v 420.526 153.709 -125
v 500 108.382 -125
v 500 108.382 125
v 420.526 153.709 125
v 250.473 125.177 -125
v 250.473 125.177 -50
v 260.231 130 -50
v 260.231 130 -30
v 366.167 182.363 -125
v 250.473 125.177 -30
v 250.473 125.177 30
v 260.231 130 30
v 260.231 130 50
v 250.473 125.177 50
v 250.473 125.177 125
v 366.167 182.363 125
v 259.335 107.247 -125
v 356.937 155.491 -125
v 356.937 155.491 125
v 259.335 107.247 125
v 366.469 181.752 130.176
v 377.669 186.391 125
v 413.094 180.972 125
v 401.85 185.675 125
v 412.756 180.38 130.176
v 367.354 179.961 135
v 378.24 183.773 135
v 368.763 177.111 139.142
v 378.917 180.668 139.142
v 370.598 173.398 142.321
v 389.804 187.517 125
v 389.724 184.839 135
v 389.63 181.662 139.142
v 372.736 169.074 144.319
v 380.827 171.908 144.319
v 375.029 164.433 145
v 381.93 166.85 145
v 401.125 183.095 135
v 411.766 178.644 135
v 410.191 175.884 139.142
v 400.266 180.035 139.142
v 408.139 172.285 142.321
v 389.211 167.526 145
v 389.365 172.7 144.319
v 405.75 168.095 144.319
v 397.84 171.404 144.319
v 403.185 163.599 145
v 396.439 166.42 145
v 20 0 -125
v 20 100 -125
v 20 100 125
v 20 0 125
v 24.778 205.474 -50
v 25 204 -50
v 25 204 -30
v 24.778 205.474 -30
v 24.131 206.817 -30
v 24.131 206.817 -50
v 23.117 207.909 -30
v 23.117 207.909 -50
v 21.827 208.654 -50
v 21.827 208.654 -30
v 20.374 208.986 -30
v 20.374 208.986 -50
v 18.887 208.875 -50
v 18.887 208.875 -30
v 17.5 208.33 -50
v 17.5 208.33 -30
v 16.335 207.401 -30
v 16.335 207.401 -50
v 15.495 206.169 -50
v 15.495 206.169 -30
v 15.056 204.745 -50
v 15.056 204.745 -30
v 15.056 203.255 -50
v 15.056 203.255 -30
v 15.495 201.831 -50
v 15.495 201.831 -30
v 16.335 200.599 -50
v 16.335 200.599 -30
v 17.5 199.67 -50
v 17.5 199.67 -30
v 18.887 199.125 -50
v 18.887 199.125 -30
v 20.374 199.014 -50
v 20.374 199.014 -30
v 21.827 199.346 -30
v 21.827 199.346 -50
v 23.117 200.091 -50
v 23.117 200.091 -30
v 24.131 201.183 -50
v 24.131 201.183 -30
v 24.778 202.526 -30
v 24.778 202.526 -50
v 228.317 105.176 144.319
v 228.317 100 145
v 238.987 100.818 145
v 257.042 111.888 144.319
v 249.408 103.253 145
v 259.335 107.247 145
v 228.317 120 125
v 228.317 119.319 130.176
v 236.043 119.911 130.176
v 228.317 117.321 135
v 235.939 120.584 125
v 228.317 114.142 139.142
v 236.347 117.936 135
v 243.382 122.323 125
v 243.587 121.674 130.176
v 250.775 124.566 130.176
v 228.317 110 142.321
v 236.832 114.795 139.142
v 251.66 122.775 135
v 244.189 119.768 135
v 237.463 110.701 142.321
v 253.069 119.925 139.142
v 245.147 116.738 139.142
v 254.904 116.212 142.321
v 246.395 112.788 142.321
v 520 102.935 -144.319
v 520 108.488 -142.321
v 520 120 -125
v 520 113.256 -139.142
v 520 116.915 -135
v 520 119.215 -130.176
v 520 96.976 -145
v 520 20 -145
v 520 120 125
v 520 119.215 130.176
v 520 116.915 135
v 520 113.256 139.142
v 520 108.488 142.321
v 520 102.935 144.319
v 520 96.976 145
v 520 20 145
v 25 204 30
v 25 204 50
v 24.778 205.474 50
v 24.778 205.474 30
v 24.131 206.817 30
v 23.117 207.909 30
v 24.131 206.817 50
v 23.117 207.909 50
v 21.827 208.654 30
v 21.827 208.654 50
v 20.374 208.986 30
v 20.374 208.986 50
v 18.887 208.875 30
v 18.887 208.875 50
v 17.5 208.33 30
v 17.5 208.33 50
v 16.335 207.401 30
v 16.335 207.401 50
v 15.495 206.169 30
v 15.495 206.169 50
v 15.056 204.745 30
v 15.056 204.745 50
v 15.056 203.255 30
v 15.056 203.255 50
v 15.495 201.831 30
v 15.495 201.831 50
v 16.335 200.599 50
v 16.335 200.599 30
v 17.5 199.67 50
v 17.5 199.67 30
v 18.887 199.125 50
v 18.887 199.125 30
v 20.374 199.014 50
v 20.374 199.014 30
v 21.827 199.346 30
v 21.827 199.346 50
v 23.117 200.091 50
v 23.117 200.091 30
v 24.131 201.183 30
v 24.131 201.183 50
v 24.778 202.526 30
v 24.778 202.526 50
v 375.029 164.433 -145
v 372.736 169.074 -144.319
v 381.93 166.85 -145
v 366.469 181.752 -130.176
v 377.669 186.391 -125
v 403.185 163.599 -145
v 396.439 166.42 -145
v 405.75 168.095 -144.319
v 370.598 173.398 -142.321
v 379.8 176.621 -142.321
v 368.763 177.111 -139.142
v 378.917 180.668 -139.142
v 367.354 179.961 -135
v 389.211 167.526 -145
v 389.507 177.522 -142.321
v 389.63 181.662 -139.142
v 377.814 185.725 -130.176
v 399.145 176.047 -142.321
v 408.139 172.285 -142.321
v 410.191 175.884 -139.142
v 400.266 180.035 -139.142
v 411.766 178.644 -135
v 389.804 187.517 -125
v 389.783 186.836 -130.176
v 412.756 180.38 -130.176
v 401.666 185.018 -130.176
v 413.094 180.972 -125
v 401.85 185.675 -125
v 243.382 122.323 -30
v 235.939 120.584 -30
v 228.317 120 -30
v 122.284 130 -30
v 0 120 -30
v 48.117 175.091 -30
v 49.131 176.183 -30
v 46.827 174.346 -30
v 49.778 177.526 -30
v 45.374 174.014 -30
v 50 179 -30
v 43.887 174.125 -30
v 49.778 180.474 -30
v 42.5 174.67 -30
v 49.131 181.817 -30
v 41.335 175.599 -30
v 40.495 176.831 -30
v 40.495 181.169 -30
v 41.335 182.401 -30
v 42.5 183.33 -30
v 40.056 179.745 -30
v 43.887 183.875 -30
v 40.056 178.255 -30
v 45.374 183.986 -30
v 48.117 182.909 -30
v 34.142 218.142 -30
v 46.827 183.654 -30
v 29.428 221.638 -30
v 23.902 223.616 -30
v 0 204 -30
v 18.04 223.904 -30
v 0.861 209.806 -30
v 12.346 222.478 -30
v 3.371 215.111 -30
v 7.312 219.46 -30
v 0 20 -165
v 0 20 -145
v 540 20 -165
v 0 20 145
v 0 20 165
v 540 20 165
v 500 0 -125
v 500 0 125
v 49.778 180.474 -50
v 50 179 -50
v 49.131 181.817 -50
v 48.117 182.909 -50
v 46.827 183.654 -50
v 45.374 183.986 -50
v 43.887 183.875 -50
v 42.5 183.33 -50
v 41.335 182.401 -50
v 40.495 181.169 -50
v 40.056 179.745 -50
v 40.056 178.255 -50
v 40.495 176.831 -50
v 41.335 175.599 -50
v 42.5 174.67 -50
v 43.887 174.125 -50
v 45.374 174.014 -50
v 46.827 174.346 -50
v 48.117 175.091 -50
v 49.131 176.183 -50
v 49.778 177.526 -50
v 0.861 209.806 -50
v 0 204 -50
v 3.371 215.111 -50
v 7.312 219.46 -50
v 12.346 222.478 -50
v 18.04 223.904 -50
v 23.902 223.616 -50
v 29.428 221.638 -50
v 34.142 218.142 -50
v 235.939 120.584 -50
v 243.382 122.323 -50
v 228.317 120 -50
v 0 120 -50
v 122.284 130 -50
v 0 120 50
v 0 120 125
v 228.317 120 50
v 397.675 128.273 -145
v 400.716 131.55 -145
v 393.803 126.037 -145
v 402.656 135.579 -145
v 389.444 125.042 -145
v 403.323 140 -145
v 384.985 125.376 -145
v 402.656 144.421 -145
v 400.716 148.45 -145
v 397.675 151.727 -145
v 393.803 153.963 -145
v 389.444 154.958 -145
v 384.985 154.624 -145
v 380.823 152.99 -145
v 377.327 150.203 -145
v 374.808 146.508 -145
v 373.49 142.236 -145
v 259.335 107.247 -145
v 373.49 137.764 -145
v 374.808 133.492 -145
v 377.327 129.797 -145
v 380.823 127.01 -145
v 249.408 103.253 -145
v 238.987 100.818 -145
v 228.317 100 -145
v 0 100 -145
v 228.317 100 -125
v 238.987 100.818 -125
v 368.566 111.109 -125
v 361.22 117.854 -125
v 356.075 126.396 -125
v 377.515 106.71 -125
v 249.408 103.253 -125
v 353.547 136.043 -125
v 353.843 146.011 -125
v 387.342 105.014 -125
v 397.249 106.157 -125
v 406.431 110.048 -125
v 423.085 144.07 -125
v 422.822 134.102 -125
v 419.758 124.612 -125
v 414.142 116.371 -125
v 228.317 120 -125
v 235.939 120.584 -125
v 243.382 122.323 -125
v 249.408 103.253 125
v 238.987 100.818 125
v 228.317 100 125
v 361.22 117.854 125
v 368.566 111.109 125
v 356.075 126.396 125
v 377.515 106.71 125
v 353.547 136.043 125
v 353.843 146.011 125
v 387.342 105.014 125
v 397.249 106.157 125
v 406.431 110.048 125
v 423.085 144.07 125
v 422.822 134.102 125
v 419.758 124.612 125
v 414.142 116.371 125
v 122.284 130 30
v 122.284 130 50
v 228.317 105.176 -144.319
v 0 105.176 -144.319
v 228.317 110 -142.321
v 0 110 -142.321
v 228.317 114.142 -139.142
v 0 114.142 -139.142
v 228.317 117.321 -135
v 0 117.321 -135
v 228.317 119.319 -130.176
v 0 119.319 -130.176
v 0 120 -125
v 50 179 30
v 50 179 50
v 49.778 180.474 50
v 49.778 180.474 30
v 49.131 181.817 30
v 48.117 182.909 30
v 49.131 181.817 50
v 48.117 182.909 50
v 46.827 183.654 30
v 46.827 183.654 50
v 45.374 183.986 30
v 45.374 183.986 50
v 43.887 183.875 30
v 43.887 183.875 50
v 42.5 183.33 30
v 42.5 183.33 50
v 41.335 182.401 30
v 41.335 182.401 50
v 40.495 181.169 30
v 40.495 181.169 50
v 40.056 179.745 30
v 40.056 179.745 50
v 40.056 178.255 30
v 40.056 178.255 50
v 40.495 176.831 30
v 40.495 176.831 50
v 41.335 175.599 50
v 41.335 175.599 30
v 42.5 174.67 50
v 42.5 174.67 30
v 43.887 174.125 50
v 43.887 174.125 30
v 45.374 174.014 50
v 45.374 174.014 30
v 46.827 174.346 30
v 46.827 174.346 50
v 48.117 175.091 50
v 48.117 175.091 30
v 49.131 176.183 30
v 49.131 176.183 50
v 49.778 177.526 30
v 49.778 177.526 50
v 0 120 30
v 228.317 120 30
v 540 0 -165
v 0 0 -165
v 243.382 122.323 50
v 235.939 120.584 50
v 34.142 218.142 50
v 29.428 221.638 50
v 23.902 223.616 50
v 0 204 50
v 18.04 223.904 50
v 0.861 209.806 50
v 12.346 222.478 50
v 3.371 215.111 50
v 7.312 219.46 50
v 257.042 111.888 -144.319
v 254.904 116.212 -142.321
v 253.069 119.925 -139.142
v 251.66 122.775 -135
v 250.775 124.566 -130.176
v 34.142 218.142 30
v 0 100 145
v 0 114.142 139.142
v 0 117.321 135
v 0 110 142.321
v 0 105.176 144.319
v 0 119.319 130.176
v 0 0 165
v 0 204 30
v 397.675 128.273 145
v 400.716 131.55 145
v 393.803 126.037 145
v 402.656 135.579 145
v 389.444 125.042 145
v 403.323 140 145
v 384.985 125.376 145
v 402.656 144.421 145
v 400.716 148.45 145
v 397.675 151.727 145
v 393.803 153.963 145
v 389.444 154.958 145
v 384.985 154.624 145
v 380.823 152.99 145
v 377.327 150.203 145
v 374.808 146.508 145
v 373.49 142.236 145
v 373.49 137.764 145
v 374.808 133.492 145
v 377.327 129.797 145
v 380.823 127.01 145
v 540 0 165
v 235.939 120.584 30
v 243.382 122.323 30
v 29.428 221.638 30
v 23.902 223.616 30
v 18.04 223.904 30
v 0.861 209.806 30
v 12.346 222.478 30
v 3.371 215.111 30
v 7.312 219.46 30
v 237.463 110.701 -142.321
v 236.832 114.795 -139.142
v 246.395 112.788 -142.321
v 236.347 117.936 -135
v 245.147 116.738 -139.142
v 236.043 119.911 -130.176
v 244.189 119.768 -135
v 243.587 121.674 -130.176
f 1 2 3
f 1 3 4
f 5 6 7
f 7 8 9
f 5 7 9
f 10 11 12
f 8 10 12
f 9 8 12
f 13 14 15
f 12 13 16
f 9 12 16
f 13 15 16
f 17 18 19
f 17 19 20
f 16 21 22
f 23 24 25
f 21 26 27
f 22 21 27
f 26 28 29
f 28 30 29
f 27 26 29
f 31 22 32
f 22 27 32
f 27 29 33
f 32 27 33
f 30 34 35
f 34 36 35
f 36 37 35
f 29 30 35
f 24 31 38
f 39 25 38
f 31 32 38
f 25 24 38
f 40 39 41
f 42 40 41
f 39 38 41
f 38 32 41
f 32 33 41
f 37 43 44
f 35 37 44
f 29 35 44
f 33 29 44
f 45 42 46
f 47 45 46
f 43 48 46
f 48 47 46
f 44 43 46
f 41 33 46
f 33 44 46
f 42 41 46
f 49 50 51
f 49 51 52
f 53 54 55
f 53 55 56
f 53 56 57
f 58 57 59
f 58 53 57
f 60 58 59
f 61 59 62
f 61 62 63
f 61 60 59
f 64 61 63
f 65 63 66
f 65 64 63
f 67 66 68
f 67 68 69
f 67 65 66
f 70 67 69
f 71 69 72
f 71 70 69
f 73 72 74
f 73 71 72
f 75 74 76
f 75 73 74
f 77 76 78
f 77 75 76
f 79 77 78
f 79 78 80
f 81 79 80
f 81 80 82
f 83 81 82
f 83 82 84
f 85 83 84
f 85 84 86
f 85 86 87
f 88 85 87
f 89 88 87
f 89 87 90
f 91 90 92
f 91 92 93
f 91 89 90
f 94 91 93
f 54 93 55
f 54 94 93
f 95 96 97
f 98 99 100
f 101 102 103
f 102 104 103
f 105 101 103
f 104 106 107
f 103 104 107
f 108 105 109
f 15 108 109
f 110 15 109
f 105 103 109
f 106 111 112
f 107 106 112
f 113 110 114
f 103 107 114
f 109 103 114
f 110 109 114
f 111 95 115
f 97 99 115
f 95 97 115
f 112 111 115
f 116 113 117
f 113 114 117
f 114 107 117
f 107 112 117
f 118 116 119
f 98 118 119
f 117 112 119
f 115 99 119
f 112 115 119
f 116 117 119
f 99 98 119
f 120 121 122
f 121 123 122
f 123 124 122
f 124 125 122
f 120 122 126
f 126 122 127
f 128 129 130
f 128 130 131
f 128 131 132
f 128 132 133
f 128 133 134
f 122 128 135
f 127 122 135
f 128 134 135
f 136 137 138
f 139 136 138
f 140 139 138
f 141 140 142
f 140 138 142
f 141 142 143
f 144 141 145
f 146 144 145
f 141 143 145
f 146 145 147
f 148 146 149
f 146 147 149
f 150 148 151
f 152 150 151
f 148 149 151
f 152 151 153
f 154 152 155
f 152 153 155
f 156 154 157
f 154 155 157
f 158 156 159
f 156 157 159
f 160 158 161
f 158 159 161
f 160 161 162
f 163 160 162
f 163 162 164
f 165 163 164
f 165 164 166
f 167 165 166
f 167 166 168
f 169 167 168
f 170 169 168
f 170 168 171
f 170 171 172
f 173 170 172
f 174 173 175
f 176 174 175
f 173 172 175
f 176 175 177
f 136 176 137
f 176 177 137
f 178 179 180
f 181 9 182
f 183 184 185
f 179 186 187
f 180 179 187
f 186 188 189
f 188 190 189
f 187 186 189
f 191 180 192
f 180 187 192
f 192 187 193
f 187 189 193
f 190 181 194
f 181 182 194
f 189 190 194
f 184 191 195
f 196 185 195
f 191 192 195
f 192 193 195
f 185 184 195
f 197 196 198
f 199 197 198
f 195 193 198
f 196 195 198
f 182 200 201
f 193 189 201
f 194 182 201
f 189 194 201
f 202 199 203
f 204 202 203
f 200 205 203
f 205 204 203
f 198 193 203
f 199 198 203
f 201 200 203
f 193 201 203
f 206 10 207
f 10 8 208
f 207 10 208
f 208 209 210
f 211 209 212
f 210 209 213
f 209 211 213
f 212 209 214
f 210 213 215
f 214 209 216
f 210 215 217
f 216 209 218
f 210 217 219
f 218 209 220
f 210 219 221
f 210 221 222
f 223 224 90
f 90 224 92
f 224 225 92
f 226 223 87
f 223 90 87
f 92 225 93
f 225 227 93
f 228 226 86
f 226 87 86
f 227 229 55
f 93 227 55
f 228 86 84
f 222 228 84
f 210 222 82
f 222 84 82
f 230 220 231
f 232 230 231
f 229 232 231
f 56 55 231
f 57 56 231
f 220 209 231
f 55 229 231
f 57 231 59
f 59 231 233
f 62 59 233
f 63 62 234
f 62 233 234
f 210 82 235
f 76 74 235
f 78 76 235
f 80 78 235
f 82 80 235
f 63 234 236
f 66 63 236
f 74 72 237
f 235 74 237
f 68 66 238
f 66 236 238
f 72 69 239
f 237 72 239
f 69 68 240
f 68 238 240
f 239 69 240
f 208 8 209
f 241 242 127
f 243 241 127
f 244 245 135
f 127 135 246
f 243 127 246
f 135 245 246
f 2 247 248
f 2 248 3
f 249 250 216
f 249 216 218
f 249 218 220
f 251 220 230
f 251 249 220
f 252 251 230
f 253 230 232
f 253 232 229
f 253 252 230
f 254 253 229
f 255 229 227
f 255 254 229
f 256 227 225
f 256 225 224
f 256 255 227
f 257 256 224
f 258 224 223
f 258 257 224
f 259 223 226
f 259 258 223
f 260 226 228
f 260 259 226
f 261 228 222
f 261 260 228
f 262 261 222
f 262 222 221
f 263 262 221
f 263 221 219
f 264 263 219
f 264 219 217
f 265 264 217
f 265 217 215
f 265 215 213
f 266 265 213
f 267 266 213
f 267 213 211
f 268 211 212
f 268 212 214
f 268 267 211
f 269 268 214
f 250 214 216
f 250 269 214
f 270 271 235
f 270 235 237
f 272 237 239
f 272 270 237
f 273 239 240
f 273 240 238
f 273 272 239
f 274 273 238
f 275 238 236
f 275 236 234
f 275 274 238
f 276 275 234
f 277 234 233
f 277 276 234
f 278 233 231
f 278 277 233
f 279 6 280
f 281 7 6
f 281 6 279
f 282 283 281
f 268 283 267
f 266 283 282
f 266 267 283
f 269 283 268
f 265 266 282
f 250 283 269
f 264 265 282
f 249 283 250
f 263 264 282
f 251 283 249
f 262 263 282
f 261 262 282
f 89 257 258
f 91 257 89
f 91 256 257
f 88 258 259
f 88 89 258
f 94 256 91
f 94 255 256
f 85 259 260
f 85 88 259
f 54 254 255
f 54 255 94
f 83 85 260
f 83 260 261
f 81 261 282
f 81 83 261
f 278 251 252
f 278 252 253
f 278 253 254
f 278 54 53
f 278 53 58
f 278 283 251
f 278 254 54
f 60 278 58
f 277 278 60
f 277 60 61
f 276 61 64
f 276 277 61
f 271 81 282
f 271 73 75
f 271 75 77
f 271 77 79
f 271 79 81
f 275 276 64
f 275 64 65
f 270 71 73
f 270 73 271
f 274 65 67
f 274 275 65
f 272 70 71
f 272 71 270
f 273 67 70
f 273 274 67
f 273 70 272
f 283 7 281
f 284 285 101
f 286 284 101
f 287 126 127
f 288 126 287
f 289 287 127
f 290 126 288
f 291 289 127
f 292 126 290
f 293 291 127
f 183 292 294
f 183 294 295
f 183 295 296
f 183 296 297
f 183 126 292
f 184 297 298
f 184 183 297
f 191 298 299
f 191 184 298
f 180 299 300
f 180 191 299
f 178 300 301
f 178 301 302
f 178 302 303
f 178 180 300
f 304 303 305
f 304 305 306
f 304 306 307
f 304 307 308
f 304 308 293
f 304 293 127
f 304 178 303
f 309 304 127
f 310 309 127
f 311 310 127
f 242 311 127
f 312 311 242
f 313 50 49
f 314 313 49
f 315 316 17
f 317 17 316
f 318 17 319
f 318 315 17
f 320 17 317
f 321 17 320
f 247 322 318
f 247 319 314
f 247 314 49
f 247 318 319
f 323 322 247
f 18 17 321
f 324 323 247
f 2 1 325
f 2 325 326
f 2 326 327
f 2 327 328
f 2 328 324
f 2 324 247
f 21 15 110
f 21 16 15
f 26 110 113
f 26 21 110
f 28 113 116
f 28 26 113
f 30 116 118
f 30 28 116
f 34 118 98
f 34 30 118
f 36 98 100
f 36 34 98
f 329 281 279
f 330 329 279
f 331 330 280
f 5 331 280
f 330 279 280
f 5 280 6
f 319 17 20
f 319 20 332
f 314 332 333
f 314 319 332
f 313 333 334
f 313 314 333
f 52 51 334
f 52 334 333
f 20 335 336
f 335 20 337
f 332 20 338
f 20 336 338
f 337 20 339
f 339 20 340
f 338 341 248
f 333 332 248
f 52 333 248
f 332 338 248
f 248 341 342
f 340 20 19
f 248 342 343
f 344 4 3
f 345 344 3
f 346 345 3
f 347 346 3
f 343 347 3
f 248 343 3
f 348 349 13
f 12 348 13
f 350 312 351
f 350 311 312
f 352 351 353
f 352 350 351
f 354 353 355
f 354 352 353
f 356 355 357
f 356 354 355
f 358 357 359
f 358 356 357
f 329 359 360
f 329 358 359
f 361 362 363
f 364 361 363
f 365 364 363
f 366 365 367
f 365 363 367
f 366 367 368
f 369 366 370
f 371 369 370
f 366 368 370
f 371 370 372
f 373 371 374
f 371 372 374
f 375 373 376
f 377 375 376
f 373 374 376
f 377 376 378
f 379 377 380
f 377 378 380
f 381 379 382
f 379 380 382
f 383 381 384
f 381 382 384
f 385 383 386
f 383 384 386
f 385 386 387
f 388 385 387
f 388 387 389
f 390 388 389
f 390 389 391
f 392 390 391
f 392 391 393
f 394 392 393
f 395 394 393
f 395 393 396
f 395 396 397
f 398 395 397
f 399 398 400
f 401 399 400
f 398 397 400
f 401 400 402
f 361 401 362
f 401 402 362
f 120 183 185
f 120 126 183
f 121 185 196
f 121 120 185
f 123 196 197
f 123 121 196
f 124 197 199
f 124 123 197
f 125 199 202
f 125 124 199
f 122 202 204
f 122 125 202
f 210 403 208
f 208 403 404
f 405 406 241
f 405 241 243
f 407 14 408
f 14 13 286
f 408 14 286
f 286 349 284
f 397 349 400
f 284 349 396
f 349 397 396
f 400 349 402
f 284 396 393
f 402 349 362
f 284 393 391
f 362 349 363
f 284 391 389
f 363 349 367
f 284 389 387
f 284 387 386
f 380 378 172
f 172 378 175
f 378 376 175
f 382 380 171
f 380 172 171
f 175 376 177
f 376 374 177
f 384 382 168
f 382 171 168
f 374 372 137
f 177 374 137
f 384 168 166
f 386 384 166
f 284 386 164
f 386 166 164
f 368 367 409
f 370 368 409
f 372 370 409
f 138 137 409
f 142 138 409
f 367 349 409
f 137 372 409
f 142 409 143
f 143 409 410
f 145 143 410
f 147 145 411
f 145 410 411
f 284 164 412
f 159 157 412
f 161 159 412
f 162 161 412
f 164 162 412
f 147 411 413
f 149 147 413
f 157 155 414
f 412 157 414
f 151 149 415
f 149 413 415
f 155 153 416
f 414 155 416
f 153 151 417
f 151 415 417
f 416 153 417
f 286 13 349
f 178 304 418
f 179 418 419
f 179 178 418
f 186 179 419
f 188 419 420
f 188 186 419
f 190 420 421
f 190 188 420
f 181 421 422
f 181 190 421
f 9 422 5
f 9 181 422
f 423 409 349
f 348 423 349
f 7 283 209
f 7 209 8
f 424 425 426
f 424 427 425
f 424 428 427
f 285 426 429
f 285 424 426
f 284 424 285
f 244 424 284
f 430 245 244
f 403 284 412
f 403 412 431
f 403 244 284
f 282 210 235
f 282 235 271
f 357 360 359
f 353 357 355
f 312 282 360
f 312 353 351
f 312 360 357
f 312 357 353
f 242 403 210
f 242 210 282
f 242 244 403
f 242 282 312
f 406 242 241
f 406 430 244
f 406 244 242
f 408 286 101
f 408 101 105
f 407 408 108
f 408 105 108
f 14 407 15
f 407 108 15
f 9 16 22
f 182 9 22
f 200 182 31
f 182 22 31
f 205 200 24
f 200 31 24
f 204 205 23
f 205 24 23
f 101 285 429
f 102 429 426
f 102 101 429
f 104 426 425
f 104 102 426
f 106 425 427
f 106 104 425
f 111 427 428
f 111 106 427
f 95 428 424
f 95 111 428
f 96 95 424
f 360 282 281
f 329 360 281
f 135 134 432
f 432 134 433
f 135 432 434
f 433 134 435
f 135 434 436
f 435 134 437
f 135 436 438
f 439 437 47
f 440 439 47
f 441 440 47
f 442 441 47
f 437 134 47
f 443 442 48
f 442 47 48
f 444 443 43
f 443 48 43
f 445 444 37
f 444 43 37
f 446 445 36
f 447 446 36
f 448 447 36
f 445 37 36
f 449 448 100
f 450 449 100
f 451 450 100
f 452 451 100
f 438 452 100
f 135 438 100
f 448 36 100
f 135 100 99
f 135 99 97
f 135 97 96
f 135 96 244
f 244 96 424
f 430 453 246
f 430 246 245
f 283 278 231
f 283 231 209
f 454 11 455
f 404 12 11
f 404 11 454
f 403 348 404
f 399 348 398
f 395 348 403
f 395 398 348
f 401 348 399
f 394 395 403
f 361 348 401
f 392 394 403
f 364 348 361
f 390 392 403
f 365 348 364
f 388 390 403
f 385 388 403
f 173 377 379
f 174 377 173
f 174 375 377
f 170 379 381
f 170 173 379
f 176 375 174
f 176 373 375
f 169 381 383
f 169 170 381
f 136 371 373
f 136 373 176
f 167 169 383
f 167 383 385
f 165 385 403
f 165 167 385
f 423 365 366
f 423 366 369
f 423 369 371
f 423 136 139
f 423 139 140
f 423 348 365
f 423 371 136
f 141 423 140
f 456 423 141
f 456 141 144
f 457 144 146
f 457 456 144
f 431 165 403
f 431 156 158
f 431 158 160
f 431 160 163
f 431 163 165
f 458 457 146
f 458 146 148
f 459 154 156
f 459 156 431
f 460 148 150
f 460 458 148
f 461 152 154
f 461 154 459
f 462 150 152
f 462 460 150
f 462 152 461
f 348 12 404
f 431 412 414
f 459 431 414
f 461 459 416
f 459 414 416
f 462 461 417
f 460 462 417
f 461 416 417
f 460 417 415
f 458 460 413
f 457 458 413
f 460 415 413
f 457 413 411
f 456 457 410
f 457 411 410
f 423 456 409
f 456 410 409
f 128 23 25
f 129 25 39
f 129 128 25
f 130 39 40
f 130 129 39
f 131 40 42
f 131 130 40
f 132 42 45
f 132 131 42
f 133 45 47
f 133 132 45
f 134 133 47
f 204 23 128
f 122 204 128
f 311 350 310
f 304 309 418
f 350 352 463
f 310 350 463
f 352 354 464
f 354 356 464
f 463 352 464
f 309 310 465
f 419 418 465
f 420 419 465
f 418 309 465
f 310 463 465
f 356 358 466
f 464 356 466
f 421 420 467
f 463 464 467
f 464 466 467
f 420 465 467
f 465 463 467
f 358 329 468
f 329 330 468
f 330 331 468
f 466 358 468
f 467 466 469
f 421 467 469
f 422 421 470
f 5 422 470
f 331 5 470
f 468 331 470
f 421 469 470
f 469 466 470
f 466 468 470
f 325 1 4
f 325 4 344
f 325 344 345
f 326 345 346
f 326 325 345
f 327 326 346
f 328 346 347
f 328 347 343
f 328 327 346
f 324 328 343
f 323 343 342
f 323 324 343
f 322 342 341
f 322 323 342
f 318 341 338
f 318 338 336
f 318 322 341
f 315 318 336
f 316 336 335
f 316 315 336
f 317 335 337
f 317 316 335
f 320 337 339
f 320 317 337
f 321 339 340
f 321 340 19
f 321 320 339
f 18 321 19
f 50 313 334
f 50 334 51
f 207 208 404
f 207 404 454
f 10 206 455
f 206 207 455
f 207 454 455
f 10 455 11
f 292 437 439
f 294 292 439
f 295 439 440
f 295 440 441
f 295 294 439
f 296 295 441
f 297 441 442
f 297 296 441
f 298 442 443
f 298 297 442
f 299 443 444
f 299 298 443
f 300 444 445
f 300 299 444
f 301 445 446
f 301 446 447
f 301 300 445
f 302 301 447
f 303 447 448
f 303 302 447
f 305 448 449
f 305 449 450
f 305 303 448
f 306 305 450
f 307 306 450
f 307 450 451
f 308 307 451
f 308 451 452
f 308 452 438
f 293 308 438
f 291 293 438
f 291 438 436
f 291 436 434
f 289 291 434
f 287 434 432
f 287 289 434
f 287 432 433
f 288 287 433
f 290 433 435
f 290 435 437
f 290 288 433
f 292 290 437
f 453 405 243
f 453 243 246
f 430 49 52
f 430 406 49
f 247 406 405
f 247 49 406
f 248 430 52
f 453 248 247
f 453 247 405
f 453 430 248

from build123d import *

# Parameters (mm, degrees)
SKETCH1_R           = 15
BOSS_EXTRUDE1_DEPTH = 145
BOSS_EXTRUDE2_START = 50
SKETCH2_R           = 5
BOSS_EXTRUDE2_DEPTH = 20
SHELL1_START        = -125
SHELL1_DEPTH        = 250
SKETCH4_W           = 520
SKETCH4_H           = 290
BOSS_EXTRUDE3_DEPTH = 20
FILLET1_R           = 20


# Read off the part's stored shape, not the designer's step: Shell1
with BuildPart() as part:
    # Sketch1 → Boss-Extrude1 (new, symmetric)
    with BuildSketch(Plane.XY):
        with BuildLine():
            Line((0, 0), (0, 120))
            Line((0, 120), (228.31744945, 120))
            ThreePointArc((228.31744945, 120), (239.69359838, 121.311364411), (250.473016236, 125.176670579))
            Line((250.473016236, 125.176670579), (366.167012988, 182.362651739))
            ThreePointArc((366.167012988, 182.362651739), (389.803653925, 187.517381697), (413.093568272, 180.972007347))
            Line((413.093568272, 180.972007347), (520, 120))
            Line((520, 120), (520, 0))
            Line((520, 0), (0, 0))
        make_face()
        with Locations((388.322579774, 140)):
            Circle(SKETCH1_R, mode=Mode.SUBTRACT)
    extrude(amount=BOSS_EXTRUDE1_DEPTH, both=True)

    # Sketch2 → Boss-Extrude2 (add)
    with BuildSketch(Plane.XY.offset(BOSS_EXTRUDE2_START)):
        with BuildLine():
            Line((0, 120), (0, 204))
            ThreePointArc((0, 204), (12.346331353, 222.47759065), (34.142135624, 218.142135624))
            Line((34.142135624, 218.142135624), (122.284271247, 130))
            Line((122.284271247, 130), (260.23118156, 130))
            Line((260.23118156, 130), (250.473016236, 125.176670579))
            ThreePointArc((250.473016236, 125.176670579), (239.69359838, 121.311364411), (228.31744945, 120))
            Line((228.31744945, 120), (0, 120))
        make_face()
        with Locations((20, 204)):
            Circle(SKETCH2_R, mode=Mode.SUBTRACT)
        with Locations((45, 179)):
            Circle(SKETCH2_R, mode=Mode.SUBTRACT)
    boss_extrude2 = extrude(amount=-BOSS_EXTRUDE2_DEPTH)

    # Mirror1: Boss-Extrude2 across plane
    add(boss_extrude2.mirror(Plane.XY))

    # Shell1 outline → Shell1 (cut)
    with BuildSketch(Plane.XY.offset(SHELL1_START)):
        with BuildLine():
            Line((356.937260838, 155.490698991), (259.33524295, 107.247338811))
            ThreePointArc((259.33524295, 107.247338811), (244.244057952, 101.835910175), (228.31744945, 100))
            Line((228.31744945, 100), (20, 100))
            Line((20, 100), (20, 0))
            Line((20, 0), (500, 0))
            Line((500, 0), (500, 108.382476706))
            Line((500, 108.382476706), (420.526102167, 153.708871052))
            ThreePointArc((420.526102167, 153.708871052), (387.342226815, 105.013732579), (356.937260838, 155.490698991))
        make_face()
    extrude(amount=SHELL1_DEPTH, mode=Mode.SUBTRACT)

    # Sketch4 → Boss-Extrude3 (add)
    # profile 1 of 2: a face of its own
    with BuildSketch(Plane.XZ):
        Polygon((540, 165), (0, 165), (0, 145), (520, 145), (520, -145), (0, -145), (0, -165), (540, -165), align=None)
    # profile 2 of 2: a face of its own
    with BuildSketch(Plane.XZ):
        with Locations((260, 0)):
            Rectangle(SKETCH4_W, SKETCH4_H)
        Polygon((20, 125), (228.31744945, 125), (259.33524295, 125), (353.322579774, 125), (356.937260838, 125), (420.526102167, 125), (423.322579774, 125), (500, 125), (500, -125), (423.322579774, -125), (420.526102167, -125), (356.937260838, -125), (353.322579774, -125), (259.33524295, -125), (228.31744945, -125), (20, -125), align=None, mode=Mode.SUBTRACT)
    extrude(amount=-BOSS_EXTRUDE3_DEPTH)

    # Fillet1
    fillet1_edges = [part.edges().sort_by_distance(p)[0] for p in [
        (389.803653925, 187.517381697, -145),
        (466.546784136, 150.486003673, -145),
        (466.546784136, 150.486003673, 145),
        (389.803653925, 187.517381697, 145),
        (308.320014612, 153.769661159, 145),
        (239.69359838, 121.311364411, 145),
        (114.158724725, 120, 145),
        (114.158724725, 120, -145),
        (239.69359838, 121.311364411, -145),
        (308.320014612, 153.769661159, -145),
    ]]
    fillet(fillet1_edges, radius=FILLET1_R)


solid = part.part
